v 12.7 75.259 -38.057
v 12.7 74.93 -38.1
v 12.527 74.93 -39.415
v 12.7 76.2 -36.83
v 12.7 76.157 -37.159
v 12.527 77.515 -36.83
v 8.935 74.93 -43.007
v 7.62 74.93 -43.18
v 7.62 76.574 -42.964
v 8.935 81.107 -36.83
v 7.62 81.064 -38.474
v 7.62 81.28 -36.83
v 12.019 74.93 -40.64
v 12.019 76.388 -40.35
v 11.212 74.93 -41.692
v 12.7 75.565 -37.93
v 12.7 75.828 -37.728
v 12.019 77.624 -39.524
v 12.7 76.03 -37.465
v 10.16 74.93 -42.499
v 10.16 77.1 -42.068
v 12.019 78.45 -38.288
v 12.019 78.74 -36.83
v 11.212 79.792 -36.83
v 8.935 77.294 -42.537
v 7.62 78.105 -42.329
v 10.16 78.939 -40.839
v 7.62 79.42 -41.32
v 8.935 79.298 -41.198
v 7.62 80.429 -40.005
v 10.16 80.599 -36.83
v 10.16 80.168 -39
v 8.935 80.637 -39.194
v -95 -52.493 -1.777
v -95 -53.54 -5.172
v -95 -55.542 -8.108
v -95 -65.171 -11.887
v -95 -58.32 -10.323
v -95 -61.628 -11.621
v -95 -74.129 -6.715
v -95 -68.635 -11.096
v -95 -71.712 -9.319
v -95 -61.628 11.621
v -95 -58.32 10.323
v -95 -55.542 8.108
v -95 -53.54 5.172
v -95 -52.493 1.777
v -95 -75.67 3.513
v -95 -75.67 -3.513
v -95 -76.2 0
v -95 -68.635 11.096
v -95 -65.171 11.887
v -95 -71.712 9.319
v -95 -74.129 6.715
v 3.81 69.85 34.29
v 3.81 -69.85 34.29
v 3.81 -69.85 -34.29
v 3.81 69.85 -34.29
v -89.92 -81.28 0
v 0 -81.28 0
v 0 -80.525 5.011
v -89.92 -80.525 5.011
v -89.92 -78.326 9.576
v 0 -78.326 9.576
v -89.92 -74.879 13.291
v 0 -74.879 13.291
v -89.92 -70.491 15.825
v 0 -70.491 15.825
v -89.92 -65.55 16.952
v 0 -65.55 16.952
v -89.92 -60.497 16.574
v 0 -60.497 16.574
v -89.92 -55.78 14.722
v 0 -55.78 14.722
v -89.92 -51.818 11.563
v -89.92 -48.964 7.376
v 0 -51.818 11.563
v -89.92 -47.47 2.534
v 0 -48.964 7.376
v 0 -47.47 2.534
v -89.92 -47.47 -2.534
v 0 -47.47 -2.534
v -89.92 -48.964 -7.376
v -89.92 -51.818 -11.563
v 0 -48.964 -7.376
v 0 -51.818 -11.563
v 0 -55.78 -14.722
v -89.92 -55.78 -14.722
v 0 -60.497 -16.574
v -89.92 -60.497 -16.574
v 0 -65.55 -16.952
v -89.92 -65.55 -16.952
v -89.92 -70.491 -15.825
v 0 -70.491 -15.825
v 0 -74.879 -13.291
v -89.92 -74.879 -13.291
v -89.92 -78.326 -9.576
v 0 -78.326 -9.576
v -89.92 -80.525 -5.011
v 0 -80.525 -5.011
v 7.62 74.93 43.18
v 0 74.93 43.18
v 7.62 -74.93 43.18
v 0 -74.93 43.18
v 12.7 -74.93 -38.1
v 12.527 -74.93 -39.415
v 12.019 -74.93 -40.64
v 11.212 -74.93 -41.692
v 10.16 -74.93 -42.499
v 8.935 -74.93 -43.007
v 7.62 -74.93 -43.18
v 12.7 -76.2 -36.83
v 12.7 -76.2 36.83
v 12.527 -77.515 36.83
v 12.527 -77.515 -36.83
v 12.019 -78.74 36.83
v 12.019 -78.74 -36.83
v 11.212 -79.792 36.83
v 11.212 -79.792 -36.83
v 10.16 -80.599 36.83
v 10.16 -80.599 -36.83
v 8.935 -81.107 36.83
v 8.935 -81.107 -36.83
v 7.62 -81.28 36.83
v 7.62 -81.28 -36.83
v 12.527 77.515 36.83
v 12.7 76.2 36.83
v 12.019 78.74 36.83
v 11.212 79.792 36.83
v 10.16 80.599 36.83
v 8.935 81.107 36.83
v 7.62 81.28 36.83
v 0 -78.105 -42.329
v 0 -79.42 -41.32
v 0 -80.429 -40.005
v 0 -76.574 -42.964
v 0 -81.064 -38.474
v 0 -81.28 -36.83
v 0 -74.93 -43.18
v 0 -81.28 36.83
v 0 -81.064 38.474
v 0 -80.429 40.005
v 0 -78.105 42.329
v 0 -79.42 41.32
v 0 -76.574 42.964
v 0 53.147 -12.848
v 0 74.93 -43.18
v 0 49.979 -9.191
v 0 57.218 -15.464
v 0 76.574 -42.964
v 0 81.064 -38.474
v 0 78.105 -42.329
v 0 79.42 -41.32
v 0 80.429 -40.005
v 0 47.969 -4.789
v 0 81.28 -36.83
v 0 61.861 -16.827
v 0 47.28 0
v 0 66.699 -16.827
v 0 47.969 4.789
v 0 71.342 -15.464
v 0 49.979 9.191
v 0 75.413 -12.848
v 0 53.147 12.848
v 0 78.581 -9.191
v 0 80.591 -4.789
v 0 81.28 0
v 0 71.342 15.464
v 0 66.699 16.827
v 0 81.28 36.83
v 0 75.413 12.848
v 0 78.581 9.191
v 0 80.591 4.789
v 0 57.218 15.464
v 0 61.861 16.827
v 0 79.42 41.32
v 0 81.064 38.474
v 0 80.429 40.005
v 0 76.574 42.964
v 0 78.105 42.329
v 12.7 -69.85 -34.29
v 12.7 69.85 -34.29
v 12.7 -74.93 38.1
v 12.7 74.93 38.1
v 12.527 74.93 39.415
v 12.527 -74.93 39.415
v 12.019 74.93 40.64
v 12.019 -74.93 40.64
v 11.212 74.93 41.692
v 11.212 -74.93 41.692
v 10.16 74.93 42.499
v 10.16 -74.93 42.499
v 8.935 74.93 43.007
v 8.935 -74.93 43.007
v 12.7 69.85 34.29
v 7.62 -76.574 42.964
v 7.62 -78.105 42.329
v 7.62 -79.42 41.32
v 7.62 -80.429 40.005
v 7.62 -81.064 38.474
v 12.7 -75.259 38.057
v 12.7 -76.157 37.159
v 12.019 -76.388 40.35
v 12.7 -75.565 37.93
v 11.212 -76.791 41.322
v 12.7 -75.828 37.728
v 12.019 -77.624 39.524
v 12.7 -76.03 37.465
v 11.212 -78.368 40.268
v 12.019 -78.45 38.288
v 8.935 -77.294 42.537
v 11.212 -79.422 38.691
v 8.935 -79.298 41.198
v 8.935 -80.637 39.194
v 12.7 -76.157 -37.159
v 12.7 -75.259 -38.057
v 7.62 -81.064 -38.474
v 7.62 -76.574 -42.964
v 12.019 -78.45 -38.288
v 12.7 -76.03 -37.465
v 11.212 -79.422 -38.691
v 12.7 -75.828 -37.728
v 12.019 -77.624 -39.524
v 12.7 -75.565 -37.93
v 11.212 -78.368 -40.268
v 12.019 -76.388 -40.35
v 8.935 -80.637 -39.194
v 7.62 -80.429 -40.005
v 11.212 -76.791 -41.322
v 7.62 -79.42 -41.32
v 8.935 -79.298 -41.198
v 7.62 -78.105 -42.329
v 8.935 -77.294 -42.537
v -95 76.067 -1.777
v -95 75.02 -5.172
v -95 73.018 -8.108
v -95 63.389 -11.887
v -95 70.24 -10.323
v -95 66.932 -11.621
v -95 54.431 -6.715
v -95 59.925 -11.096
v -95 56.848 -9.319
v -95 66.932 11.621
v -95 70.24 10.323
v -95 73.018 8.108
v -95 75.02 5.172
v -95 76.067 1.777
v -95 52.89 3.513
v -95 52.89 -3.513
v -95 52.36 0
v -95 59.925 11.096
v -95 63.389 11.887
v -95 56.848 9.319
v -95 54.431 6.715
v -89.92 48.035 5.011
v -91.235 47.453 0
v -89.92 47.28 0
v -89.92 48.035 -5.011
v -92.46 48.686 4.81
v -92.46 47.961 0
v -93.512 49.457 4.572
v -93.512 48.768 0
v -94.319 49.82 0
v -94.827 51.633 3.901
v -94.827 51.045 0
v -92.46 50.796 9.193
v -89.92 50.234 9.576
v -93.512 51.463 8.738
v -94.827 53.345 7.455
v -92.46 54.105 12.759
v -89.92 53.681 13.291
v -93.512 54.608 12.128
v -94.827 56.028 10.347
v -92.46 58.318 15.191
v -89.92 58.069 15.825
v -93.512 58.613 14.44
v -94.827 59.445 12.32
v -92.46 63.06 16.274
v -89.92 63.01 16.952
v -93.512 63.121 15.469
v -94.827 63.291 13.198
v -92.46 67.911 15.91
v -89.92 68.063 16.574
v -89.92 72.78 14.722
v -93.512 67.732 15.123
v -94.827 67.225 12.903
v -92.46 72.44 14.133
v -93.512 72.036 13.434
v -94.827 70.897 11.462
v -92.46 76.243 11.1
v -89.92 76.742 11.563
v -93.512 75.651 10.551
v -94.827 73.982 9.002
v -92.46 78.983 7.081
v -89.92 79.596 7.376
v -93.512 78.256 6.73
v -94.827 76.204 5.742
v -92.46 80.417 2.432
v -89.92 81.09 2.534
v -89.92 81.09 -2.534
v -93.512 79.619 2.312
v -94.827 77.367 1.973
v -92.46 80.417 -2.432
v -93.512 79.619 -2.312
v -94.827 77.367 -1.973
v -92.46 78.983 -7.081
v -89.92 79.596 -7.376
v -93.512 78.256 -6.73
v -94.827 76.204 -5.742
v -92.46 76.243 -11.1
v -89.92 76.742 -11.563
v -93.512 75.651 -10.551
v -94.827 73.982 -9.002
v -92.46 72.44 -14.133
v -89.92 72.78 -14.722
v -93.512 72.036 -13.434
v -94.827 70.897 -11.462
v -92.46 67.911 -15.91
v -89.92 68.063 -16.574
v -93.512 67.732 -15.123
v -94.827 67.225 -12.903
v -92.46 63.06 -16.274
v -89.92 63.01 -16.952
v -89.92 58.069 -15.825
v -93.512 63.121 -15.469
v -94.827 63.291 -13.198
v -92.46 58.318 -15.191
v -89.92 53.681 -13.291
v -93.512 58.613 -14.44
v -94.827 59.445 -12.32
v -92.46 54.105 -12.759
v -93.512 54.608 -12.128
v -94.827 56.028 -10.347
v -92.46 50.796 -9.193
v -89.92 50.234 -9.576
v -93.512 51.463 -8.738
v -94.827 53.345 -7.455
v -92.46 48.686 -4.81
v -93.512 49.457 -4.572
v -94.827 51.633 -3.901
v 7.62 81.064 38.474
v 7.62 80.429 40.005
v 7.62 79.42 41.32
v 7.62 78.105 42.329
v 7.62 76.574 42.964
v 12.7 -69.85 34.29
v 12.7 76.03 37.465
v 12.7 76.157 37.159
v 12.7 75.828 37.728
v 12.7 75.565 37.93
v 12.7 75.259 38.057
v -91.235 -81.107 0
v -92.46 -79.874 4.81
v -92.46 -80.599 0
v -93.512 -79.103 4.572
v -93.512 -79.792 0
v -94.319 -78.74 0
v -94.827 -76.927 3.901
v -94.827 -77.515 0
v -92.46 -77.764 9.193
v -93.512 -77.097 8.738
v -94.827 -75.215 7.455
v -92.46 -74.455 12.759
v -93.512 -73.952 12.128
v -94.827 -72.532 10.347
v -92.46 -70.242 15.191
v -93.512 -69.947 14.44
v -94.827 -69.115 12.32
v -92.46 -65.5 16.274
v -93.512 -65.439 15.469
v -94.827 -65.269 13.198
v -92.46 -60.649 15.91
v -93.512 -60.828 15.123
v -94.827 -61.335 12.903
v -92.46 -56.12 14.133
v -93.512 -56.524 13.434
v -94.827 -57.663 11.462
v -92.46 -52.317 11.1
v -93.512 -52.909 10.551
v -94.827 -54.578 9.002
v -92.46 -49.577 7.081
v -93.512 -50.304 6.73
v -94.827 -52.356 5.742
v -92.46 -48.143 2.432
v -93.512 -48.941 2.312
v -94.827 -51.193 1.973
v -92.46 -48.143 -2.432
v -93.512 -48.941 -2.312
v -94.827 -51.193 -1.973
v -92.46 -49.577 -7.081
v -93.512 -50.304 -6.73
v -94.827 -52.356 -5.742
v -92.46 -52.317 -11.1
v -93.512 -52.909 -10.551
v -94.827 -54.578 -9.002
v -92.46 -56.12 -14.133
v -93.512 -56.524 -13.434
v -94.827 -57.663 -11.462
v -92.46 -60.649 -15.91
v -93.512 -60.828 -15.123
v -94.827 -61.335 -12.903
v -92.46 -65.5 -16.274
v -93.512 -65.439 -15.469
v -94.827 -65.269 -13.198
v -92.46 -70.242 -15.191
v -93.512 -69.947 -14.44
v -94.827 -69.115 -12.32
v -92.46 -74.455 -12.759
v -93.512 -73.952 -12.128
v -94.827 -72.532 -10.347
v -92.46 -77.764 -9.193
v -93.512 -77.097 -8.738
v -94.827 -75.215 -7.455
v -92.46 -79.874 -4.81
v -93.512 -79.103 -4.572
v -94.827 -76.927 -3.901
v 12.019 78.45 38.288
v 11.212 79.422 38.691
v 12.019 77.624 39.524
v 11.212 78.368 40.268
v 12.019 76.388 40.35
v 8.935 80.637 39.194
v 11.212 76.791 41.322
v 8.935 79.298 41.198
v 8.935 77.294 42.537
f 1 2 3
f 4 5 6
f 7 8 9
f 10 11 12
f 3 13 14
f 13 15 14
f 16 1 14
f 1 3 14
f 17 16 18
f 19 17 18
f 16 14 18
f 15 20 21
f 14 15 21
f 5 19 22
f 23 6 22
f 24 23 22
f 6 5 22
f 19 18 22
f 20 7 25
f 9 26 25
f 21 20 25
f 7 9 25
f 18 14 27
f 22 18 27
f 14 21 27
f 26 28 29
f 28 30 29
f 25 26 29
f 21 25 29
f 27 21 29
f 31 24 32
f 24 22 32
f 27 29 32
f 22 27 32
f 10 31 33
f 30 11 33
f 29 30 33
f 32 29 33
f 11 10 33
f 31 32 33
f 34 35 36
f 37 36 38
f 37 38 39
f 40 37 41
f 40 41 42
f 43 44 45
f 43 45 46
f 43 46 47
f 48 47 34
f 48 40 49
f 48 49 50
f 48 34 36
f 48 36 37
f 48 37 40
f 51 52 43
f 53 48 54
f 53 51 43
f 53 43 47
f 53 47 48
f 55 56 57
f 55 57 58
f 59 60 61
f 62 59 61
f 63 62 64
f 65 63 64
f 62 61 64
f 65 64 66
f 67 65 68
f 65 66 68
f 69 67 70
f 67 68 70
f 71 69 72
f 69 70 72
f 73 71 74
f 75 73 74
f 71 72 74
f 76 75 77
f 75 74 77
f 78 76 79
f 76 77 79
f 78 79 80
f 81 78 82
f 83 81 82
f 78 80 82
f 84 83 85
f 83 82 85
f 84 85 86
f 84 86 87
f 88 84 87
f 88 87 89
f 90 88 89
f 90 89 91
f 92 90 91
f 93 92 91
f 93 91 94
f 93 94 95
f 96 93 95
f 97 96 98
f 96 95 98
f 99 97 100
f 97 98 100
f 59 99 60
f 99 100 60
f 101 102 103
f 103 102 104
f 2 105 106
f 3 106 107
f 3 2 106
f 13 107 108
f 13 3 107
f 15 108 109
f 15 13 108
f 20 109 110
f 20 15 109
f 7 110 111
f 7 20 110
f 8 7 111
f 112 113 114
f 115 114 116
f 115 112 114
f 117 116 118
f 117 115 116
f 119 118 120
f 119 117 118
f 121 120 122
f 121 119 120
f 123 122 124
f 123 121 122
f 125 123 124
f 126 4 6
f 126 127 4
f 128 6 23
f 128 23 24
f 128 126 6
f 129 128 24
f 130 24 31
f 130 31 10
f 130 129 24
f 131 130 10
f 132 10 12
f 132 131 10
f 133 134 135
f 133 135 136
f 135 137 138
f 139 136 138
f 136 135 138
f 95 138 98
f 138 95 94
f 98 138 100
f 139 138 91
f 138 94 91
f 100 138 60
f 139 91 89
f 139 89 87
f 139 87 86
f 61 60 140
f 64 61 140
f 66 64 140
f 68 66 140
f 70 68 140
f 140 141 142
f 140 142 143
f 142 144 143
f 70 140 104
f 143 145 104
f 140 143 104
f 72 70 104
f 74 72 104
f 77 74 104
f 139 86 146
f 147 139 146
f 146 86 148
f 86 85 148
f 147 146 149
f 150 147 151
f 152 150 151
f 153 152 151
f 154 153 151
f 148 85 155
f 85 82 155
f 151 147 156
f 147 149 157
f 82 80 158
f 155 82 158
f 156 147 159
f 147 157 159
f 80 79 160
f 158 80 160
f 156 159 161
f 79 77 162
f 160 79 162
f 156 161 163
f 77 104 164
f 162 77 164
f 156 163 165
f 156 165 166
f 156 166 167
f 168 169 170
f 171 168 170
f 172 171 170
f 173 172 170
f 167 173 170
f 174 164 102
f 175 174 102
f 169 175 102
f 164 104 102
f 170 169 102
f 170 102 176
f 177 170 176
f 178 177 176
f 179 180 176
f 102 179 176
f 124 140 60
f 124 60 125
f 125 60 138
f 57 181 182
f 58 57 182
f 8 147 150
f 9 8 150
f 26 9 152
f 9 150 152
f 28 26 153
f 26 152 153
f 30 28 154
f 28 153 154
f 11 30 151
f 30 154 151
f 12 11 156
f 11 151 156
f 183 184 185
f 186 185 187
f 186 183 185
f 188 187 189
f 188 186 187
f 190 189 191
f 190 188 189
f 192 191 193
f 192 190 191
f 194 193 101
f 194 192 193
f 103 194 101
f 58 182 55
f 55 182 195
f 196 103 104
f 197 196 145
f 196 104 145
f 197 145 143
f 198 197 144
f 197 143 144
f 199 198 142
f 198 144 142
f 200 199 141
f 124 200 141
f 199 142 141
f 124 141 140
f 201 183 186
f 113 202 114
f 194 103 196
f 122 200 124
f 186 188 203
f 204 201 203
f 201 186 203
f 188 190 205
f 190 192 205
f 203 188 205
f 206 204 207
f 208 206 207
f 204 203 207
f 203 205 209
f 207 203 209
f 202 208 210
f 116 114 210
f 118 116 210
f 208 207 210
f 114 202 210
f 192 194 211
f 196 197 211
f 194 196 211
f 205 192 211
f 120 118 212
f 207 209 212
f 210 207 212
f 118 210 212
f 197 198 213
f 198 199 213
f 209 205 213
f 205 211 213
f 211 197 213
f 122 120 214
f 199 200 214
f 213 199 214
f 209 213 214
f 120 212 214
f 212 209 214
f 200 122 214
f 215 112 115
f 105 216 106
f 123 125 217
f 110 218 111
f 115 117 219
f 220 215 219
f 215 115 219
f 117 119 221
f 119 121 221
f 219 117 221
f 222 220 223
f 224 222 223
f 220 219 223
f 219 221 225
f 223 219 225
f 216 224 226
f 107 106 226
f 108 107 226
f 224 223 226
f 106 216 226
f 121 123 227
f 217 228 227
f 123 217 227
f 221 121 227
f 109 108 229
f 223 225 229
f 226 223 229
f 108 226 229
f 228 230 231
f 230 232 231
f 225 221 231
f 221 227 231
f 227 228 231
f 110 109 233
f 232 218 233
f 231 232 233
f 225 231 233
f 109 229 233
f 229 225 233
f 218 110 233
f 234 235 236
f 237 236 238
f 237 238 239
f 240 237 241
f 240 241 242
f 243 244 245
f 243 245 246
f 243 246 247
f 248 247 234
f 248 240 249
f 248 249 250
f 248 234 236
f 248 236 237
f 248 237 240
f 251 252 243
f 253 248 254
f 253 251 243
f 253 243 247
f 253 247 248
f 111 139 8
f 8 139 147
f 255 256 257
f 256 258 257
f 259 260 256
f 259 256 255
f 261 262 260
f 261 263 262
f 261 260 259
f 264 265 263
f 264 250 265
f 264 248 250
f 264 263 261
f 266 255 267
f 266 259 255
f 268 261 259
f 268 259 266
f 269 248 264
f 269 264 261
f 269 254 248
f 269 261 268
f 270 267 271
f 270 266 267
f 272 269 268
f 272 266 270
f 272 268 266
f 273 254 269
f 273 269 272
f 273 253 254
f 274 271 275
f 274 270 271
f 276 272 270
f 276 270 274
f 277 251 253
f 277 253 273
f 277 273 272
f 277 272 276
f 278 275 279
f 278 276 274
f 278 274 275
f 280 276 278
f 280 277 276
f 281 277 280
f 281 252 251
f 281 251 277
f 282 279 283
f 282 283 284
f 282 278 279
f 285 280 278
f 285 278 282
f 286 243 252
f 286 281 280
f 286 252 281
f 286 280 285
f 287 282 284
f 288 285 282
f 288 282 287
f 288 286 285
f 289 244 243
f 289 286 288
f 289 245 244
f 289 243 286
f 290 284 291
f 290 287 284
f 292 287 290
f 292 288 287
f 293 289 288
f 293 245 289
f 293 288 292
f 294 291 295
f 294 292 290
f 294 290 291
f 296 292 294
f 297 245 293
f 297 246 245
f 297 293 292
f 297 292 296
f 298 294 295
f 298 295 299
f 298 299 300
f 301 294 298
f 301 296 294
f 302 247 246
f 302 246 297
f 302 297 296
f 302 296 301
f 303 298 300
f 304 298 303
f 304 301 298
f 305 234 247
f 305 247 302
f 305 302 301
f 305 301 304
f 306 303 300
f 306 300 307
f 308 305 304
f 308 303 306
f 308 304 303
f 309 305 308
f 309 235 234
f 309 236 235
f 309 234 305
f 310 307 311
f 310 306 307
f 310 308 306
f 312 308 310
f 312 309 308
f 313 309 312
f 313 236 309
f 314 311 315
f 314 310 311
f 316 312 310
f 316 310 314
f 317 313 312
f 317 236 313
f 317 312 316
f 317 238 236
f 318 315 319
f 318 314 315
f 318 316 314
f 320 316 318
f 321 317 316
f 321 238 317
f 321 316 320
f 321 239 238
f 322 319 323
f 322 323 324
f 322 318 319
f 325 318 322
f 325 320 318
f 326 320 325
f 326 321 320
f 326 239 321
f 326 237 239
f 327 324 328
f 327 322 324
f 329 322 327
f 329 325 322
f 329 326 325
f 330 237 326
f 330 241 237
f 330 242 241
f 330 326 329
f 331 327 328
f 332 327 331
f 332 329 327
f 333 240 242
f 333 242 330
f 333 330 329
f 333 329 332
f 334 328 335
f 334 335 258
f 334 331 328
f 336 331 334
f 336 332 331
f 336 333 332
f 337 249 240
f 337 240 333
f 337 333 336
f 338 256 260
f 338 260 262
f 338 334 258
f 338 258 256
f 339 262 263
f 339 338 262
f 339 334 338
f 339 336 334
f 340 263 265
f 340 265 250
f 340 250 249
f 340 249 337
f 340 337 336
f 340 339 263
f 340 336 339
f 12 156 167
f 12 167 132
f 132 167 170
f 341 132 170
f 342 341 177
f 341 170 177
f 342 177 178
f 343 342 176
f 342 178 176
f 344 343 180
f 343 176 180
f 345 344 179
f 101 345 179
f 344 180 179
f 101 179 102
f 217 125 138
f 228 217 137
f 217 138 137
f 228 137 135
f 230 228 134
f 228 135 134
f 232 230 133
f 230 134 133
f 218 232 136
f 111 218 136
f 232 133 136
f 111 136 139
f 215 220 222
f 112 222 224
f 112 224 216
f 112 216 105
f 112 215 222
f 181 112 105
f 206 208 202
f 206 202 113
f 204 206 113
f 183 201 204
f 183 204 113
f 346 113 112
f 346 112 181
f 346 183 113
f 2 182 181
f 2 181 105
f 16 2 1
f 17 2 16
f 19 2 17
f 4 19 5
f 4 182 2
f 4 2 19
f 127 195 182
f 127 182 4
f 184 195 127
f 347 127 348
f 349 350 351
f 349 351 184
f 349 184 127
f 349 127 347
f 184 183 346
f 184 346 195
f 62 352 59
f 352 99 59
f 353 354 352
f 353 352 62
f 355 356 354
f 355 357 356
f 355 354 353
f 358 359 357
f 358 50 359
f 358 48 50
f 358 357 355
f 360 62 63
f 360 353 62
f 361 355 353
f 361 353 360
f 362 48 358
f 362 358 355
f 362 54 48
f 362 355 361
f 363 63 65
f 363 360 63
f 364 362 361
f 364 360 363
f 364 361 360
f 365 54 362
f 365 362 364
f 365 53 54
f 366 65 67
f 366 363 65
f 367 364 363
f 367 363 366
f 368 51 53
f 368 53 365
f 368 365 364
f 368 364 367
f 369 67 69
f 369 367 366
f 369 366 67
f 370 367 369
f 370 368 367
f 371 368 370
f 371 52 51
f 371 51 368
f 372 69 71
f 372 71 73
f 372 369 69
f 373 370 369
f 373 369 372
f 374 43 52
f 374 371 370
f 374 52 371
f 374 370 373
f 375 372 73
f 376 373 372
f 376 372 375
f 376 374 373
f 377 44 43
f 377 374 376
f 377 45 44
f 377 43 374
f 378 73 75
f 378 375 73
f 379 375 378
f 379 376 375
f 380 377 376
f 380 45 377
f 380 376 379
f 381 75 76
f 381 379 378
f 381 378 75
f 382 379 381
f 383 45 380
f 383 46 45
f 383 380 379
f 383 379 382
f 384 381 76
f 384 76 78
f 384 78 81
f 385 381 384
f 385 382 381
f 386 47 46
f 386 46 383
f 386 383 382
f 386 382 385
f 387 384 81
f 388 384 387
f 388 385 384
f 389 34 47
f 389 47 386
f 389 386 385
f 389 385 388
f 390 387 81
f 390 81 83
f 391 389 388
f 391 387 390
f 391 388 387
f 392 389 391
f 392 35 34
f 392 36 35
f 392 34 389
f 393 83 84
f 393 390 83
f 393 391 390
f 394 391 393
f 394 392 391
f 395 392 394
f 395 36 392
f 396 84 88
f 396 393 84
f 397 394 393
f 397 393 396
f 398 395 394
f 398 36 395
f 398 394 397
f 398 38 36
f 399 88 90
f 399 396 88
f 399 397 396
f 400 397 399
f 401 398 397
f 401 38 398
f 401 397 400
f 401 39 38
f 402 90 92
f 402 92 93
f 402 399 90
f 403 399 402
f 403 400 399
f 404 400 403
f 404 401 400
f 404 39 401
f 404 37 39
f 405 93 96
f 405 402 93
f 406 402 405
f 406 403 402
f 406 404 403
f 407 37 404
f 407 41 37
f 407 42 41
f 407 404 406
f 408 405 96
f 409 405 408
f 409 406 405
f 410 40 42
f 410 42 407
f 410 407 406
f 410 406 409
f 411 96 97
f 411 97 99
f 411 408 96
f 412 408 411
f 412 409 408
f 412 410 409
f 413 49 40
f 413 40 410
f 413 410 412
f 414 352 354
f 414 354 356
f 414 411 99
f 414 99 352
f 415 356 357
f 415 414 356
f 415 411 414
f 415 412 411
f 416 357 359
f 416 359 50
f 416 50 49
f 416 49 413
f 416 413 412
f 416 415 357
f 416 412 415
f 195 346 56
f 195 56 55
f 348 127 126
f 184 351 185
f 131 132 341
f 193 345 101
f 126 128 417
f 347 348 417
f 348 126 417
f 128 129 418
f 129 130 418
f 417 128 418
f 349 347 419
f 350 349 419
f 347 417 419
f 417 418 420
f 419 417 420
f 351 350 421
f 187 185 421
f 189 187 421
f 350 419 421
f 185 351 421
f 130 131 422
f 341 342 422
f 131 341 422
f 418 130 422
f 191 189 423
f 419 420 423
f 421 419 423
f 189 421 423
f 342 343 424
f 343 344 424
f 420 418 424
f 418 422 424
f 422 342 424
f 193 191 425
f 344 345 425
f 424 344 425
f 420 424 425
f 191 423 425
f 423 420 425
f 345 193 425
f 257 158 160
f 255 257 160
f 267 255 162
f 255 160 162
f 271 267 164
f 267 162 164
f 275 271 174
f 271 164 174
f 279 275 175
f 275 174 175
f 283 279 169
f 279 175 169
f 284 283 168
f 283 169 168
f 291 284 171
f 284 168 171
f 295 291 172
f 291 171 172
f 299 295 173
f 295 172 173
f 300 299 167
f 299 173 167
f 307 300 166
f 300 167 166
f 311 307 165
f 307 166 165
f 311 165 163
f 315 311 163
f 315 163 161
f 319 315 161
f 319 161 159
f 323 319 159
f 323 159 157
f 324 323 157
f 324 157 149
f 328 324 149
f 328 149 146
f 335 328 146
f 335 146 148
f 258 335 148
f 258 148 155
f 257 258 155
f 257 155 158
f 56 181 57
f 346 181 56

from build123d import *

# Parameters (mm, degrees)
F1_DEPTH = 12.7
F2_W     = 139.7
F2_H     = 68.58
F3_DEPTH = 8.89
F4_R     = 5.08
F5_R     = 17
F6_DEPTH = 95
F7_R     = 5.08


with BuildPart() as f1:
    # F0 (on Right) → F1 (new body)
    with BuildSketch(Plane.YZ):
        with BuildLine():
            Line((74.93, 43.18), (-74.93, 43.18))
            ThreePointArc((-74.93, 43.18), (-79.420128, 41.320128), (-81.28, 36.83))
            Line((-81.28, 36.83), (-81.28, -36.83))
            ThreePointArc((-81.28, -36.83), (-79.420128, -41.320128), (-74.93, -43.18))
            Line((-74.93, -43.18), (74.93, -43.18))
            ThreePointArc((74.93, -43.18), (79.420128, -41.320128), (81.28, -36.83))
            Line((81.28, -36.83), (81.28, 36.83))
            ThreePointArc((81.28, 36.83), (79.420128, 41.320128), (74.93, 43.18))
        make_face()
    extrude(amount=F1_DEPTH)

    # F2 (on face) → F3 (cut)
    with BuildSketch(Plane.YZ.offset(12.7)):
        Rectangle(F2_W, F2_H)
    extrude(amount=-F3_DEPTH, mode=Mode.SUBTRACT)

    # F4
    f4_edges = [f1.edges().sort_by_distance(p)[0] for p in [
        (12.7, 81.28, 0),
        (12.7, 0, 43.18),
        (12.7, -81.28, 0),
        (12.7, 0, -43.18),
    ]]
    fillet(f4_edges, radius=F4_R)

    # F5 (on face) → F6 (join)
    with BuildSketch(Plane(origin=(0, 0, 0), x_dir=(0, -1, 0), z_dir=(-1, 0, 0))):
        with Locations((-64.28, 0)):
            Circle(F5_R)
        with Locations((64.28, 0)):
            Circle(F5_R)
    extrude(amount=F6_DEPTH)

    # F7
    f7_edges = [f1.edges().sort_by_distance(p)[0] for p in [
        (-95, -47.28, 0),
        (-95, 81.28, 0),
    ]]
    fillet(f7_edges, radius=F7_R)


solid = f1.part
